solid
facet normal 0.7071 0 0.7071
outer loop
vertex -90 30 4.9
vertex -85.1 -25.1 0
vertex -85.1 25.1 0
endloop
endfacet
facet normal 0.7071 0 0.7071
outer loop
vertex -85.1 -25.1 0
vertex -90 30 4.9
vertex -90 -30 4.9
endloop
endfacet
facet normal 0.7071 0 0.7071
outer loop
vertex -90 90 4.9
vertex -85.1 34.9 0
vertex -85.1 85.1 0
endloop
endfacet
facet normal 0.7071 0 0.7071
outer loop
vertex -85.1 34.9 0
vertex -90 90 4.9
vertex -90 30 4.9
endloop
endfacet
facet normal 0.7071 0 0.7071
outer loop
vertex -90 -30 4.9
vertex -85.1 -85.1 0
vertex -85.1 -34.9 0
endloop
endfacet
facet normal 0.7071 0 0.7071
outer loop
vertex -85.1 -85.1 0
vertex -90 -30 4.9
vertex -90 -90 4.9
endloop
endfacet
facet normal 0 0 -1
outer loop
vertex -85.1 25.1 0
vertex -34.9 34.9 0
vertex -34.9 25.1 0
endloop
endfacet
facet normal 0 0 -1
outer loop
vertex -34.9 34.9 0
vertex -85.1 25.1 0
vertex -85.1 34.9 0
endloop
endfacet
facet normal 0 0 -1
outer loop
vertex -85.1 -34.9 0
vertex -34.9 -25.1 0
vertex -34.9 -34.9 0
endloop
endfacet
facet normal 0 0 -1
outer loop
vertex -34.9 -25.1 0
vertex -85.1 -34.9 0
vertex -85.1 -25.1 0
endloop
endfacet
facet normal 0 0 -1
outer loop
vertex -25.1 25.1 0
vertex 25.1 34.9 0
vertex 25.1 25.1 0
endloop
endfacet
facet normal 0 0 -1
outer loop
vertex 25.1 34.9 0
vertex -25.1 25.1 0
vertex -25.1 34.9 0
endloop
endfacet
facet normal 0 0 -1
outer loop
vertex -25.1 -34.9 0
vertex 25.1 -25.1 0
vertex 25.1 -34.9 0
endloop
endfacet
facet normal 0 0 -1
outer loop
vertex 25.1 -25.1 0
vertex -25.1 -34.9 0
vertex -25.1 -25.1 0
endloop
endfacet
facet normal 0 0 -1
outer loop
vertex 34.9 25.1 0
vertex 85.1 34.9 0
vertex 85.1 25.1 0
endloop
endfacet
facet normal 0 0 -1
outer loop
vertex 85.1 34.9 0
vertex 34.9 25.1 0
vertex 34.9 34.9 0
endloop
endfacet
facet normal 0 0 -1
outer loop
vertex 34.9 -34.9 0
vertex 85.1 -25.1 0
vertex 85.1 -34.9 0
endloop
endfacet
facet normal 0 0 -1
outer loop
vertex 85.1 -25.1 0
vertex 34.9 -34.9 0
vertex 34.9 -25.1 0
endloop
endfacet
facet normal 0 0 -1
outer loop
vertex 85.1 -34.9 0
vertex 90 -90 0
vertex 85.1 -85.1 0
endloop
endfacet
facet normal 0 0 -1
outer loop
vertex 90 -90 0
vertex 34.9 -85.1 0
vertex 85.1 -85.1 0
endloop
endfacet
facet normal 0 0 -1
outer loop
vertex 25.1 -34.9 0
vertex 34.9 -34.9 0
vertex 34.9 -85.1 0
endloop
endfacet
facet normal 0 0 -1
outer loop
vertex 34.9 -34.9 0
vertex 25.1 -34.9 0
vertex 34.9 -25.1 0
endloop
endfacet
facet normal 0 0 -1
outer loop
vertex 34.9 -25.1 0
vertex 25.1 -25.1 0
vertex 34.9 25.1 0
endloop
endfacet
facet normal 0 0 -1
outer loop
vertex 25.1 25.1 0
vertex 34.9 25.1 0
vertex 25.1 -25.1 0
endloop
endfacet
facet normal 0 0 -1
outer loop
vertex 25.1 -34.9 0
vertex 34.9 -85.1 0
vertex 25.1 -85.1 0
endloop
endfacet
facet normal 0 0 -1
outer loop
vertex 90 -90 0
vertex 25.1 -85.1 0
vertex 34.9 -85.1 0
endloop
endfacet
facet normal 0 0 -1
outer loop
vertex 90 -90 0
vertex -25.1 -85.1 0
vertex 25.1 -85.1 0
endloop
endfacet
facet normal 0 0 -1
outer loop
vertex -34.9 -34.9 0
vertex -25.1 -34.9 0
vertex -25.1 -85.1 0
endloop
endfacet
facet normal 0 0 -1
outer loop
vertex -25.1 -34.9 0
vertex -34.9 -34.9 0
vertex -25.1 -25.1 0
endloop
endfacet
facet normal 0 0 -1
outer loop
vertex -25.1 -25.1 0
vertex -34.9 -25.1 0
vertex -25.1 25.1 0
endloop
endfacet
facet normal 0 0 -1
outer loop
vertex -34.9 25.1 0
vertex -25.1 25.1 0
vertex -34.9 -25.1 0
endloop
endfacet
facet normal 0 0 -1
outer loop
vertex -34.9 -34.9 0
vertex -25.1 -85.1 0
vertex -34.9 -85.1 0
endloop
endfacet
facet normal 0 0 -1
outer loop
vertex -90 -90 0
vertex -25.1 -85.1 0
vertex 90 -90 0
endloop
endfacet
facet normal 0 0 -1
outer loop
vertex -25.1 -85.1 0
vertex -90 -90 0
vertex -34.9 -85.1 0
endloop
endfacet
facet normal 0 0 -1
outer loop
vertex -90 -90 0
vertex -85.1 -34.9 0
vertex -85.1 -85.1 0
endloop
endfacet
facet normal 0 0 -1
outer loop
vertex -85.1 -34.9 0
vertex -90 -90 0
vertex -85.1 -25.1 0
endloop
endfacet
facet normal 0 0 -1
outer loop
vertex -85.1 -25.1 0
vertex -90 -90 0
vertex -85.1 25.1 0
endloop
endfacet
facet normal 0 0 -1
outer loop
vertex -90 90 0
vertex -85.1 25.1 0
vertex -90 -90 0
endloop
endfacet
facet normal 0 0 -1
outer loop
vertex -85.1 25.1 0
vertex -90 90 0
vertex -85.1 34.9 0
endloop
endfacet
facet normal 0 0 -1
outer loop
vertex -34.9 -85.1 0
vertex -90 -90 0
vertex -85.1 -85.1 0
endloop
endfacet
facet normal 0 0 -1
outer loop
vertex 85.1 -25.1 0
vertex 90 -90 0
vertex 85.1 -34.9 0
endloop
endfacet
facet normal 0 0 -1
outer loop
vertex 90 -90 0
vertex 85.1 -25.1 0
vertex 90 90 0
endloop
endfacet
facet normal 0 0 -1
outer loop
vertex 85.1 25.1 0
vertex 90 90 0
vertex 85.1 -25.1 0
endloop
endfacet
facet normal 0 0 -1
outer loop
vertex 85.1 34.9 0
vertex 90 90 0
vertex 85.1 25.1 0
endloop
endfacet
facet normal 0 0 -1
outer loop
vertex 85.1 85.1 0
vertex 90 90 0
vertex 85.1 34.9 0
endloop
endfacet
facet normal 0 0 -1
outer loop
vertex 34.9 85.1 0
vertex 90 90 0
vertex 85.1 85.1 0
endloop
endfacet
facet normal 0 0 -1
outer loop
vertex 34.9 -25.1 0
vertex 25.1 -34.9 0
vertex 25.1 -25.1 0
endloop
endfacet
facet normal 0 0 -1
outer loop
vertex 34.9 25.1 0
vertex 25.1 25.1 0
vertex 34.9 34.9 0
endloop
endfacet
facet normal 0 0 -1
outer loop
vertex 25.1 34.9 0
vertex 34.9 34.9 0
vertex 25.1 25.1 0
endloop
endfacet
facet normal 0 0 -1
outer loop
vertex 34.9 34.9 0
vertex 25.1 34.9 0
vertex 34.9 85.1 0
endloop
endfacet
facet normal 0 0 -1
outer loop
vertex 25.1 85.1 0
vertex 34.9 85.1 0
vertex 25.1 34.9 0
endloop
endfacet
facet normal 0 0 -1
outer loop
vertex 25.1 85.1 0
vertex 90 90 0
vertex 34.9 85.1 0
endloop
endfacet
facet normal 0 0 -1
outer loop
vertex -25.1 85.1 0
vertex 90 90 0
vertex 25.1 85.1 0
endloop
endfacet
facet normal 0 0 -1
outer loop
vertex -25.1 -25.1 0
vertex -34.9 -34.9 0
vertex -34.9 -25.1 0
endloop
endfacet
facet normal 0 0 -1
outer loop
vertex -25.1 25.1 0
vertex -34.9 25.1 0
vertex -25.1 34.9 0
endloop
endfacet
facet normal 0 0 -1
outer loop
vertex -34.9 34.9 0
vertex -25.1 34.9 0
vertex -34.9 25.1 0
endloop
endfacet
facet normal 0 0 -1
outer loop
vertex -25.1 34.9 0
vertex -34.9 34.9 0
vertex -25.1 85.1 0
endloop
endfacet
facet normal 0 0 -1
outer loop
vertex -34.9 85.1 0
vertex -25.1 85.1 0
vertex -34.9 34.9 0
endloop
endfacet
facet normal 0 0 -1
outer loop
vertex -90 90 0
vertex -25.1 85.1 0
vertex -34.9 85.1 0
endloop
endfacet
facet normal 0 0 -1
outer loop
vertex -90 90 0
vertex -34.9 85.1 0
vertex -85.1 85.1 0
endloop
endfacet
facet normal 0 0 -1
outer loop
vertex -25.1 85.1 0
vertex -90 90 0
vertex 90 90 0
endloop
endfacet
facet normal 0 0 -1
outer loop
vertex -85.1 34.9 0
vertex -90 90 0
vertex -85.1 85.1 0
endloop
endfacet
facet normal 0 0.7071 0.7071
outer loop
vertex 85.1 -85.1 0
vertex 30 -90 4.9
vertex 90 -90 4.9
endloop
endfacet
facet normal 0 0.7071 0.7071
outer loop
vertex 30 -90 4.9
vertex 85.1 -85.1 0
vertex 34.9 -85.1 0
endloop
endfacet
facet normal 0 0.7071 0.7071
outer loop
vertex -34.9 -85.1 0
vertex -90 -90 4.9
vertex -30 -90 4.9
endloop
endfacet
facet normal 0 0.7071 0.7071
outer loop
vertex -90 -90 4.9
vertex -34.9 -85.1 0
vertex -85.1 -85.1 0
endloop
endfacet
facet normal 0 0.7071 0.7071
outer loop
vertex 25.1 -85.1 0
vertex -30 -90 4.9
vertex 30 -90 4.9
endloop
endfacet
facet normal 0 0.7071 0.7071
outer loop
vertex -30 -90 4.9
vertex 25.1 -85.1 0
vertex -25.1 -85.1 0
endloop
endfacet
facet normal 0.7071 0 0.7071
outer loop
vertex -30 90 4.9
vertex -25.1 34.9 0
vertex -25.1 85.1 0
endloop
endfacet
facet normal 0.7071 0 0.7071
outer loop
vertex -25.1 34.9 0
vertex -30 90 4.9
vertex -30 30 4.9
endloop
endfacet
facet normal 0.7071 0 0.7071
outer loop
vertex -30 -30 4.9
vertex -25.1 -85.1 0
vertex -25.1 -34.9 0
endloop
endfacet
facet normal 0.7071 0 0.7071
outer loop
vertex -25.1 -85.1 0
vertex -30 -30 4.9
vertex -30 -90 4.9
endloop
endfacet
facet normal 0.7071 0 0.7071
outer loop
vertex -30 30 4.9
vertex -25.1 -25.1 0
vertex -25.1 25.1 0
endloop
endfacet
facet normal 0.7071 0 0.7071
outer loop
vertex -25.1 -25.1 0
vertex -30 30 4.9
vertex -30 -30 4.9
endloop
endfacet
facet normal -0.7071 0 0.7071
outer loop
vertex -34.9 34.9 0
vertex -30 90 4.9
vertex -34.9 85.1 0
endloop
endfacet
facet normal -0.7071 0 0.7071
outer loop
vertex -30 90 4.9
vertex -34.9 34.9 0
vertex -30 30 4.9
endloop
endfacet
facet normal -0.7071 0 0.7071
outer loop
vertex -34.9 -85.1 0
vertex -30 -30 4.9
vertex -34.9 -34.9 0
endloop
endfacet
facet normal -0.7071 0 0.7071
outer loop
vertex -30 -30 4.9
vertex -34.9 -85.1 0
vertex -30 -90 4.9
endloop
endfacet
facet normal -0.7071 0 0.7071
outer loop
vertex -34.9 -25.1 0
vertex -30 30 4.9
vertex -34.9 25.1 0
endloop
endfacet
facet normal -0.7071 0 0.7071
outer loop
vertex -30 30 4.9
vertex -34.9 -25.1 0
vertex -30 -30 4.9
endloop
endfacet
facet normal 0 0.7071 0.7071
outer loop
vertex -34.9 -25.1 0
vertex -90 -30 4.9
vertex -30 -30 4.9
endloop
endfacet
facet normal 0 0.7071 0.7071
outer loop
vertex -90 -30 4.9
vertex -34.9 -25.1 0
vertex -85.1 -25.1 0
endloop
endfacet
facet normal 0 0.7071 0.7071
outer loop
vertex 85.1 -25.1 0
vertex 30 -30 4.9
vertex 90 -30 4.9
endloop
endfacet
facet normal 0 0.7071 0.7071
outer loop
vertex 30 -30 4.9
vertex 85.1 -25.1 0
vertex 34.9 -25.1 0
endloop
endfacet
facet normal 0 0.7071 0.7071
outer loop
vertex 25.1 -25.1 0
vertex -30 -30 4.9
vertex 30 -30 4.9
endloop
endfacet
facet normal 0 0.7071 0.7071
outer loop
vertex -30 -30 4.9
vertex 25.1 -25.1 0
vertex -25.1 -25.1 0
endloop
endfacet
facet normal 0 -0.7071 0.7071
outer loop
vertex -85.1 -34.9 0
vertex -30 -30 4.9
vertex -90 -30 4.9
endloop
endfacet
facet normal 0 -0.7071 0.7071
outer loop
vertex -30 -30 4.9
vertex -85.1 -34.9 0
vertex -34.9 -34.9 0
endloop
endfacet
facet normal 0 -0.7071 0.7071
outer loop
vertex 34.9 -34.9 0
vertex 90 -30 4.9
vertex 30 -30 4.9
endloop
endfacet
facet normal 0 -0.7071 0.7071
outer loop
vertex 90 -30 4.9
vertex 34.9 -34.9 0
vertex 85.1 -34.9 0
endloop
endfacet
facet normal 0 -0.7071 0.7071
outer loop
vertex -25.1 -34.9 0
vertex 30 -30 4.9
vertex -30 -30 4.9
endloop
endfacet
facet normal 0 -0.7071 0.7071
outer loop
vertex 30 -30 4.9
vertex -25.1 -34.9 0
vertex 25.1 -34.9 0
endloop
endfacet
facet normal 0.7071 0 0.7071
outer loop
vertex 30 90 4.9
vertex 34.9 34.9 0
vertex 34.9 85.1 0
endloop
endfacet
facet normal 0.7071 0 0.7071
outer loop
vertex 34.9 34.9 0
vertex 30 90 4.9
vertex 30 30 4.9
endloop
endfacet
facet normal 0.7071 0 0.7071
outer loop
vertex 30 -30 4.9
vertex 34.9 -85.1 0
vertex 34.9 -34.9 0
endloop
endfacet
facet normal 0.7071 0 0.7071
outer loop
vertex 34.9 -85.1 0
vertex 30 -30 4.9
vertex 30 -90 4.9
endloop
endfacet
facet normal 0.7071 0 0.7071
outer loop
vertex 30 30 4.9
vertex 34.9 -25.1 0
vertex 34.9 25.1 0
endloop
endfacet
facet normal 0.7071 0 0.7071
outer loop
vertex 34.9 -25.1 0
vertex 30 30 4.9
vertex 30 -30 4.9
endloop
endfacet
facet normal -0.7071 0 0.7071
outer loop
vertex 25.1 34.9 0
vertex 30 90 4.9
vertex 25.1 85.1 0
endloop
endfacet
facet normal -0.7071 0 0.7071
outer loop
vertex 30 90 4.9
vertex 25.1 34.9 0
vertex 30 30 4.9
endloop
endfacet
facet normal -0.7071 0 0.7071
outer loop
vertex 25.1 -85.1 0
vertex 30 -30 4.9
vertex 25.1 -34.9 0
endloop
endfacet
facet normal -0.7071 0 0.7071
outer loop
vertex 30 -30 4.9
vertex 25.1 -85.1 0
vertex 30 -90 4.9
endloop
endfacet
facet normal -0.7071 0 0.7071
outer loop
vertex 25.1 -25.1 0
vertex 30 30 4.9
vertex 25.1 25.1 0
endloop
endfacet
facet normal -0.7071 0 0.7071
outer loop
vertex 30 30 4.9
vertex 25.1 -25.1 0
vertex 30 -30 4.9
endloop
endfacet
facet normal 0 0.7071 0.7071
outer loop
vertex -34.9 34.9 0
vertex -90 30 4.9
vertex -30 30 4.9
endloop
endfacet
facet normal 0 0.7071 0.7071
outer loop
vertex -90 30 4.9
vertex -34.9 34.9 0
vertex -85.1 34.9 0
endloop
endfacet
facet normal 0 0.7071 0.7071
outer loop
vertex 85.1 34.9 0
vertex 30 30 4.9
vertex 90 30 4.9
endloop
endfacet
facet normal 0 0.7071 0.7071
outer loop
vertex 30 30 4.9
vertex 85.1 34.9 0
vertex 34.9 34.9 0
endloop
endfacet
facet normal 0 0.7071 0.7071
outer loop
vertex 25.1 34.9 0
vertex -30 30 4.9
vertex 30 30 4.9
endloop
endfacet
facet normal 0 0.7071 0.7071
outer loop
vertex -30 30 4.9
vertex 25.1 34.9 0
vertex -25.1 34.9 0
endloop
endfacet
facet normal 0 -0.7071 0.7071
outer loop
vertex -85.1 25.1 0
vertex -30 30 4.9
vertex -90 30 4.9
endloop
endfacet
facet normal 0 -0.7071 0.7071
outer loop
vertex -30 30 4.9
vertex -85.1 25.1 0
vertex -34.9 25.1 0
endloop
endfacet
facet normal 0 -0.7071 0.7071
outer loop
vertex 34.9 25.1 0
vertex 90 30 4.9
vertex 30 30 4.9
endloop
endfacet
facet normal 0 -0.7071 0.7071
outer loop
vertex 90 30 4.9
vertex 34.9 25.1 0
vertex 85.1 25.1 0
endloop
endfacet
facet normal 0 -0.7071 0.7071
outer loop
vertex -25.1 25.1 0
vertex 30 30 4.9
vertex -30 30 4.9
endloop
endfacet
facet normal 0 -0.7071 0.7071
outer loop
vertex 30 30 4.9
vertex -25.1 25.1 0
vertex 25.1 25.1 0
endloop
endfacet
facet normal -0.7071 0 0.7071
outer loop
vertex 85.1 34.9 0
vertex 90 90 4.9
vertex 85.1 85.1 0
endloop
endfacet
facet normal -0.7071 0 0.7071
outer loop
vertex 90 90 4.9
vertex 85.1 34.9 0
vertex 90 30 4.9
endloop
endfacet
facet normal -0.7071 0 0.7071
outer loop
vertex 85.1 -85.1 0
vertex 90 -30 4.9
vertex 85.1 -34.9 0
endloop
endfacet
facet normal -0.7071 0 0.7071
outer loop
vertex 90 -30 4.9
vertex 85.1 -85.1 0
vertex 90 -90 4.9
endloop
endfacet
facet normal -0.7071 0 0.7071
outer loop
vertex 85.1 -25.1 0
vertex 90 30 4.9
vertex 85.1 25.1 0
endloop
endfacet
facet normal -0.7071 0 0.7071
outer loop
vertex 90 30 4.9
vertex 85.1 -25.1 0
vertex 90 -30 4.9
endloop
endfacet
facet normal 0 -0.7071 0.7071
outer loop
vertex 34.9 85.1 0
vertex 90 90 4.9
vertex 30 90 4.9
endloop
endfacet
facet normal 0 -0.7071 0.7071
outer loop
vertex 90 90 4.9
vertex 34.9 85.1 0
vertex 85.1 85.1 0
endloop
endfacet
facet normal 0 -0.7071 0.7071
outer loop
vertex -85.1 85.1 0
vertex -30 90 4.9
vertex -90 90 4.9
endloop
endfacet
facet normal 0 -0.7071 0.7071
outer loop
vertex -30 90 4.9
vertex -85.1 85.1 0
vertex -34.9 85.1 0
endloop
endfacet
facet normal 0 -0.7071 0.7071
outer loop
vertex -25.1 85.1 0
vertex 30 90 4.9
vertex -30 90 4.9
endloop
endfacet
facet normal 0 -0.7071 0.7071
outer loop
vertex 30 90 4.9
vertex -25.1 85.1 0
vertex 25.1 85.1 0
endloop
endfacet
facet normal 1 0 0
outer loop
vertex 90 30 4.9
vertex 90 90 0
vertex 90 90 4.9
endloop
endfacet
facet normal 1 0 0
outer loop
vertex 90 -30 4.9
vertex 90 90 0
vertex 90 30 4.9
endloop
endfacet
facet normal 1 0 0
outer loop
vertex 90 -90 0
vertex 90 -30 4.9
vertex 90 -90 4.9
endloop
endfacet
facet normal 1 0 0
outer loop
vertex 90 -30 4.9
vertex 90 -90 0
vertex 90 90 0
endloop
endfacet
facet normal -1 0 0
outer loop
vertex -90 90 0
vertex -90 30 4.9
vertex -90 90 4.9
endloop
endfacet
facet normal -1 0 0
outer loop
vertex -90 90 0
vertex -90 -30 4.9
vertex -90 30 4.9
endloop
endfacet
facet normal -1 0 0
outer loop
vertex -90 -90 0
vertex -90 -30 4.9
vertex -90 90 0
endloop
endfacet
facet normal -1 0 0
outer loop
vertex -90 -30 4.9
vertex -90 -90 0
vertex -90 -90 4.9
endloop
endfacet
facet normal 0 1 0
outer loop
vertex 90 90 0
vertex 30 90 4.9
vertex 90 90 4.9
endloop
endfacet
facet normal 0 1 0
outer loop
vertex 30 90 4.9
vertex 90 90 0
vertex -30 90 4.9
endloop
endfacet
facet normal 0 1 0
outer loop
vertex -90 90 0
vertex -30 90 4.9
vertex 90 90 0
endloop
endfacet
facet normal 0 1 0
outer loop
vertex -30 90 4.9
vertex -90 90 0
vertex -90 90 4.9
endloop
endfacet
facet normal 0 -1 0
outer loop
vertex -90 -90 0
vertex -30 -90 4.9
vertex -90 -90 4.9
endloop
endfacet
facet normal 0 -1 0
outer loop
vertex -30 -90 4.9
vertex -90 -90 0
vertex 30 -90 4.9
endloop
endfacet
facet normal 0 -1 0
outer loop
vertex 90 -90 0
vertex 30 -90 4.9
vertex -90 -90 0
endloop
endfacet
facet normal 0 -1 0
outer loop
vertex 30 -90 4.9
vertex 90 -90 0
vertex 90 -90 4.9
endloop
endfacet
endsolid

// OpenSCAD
$fn=50;

edge=4.9;
box_size=60;
grid_size=3;

grid_len=grid_size*box_size;

intersection() {
    for (i = [0:grid_size]) {
        translate([i*box_size-grid_len/2, grid_len/2, 0]) {
            rail(grid_len);
        }
        rotate([0, 0, 90]) {
            translate([i*box_size-grid_len/2, grid_len/2, 0]) {
                rail(grid_len);
            }
        }
    }
    translate([-grid_len/2, -grid_len/2, 0]) {
        cube([grid_len, grid_len, edge]);
    }
}

module rail(len) {
    rotate([90,0,0]) {
        linear_extrude(height = len) {
            polygon([[edge,0],[0,edge],[-edge,0]]);
        }
    }
}
